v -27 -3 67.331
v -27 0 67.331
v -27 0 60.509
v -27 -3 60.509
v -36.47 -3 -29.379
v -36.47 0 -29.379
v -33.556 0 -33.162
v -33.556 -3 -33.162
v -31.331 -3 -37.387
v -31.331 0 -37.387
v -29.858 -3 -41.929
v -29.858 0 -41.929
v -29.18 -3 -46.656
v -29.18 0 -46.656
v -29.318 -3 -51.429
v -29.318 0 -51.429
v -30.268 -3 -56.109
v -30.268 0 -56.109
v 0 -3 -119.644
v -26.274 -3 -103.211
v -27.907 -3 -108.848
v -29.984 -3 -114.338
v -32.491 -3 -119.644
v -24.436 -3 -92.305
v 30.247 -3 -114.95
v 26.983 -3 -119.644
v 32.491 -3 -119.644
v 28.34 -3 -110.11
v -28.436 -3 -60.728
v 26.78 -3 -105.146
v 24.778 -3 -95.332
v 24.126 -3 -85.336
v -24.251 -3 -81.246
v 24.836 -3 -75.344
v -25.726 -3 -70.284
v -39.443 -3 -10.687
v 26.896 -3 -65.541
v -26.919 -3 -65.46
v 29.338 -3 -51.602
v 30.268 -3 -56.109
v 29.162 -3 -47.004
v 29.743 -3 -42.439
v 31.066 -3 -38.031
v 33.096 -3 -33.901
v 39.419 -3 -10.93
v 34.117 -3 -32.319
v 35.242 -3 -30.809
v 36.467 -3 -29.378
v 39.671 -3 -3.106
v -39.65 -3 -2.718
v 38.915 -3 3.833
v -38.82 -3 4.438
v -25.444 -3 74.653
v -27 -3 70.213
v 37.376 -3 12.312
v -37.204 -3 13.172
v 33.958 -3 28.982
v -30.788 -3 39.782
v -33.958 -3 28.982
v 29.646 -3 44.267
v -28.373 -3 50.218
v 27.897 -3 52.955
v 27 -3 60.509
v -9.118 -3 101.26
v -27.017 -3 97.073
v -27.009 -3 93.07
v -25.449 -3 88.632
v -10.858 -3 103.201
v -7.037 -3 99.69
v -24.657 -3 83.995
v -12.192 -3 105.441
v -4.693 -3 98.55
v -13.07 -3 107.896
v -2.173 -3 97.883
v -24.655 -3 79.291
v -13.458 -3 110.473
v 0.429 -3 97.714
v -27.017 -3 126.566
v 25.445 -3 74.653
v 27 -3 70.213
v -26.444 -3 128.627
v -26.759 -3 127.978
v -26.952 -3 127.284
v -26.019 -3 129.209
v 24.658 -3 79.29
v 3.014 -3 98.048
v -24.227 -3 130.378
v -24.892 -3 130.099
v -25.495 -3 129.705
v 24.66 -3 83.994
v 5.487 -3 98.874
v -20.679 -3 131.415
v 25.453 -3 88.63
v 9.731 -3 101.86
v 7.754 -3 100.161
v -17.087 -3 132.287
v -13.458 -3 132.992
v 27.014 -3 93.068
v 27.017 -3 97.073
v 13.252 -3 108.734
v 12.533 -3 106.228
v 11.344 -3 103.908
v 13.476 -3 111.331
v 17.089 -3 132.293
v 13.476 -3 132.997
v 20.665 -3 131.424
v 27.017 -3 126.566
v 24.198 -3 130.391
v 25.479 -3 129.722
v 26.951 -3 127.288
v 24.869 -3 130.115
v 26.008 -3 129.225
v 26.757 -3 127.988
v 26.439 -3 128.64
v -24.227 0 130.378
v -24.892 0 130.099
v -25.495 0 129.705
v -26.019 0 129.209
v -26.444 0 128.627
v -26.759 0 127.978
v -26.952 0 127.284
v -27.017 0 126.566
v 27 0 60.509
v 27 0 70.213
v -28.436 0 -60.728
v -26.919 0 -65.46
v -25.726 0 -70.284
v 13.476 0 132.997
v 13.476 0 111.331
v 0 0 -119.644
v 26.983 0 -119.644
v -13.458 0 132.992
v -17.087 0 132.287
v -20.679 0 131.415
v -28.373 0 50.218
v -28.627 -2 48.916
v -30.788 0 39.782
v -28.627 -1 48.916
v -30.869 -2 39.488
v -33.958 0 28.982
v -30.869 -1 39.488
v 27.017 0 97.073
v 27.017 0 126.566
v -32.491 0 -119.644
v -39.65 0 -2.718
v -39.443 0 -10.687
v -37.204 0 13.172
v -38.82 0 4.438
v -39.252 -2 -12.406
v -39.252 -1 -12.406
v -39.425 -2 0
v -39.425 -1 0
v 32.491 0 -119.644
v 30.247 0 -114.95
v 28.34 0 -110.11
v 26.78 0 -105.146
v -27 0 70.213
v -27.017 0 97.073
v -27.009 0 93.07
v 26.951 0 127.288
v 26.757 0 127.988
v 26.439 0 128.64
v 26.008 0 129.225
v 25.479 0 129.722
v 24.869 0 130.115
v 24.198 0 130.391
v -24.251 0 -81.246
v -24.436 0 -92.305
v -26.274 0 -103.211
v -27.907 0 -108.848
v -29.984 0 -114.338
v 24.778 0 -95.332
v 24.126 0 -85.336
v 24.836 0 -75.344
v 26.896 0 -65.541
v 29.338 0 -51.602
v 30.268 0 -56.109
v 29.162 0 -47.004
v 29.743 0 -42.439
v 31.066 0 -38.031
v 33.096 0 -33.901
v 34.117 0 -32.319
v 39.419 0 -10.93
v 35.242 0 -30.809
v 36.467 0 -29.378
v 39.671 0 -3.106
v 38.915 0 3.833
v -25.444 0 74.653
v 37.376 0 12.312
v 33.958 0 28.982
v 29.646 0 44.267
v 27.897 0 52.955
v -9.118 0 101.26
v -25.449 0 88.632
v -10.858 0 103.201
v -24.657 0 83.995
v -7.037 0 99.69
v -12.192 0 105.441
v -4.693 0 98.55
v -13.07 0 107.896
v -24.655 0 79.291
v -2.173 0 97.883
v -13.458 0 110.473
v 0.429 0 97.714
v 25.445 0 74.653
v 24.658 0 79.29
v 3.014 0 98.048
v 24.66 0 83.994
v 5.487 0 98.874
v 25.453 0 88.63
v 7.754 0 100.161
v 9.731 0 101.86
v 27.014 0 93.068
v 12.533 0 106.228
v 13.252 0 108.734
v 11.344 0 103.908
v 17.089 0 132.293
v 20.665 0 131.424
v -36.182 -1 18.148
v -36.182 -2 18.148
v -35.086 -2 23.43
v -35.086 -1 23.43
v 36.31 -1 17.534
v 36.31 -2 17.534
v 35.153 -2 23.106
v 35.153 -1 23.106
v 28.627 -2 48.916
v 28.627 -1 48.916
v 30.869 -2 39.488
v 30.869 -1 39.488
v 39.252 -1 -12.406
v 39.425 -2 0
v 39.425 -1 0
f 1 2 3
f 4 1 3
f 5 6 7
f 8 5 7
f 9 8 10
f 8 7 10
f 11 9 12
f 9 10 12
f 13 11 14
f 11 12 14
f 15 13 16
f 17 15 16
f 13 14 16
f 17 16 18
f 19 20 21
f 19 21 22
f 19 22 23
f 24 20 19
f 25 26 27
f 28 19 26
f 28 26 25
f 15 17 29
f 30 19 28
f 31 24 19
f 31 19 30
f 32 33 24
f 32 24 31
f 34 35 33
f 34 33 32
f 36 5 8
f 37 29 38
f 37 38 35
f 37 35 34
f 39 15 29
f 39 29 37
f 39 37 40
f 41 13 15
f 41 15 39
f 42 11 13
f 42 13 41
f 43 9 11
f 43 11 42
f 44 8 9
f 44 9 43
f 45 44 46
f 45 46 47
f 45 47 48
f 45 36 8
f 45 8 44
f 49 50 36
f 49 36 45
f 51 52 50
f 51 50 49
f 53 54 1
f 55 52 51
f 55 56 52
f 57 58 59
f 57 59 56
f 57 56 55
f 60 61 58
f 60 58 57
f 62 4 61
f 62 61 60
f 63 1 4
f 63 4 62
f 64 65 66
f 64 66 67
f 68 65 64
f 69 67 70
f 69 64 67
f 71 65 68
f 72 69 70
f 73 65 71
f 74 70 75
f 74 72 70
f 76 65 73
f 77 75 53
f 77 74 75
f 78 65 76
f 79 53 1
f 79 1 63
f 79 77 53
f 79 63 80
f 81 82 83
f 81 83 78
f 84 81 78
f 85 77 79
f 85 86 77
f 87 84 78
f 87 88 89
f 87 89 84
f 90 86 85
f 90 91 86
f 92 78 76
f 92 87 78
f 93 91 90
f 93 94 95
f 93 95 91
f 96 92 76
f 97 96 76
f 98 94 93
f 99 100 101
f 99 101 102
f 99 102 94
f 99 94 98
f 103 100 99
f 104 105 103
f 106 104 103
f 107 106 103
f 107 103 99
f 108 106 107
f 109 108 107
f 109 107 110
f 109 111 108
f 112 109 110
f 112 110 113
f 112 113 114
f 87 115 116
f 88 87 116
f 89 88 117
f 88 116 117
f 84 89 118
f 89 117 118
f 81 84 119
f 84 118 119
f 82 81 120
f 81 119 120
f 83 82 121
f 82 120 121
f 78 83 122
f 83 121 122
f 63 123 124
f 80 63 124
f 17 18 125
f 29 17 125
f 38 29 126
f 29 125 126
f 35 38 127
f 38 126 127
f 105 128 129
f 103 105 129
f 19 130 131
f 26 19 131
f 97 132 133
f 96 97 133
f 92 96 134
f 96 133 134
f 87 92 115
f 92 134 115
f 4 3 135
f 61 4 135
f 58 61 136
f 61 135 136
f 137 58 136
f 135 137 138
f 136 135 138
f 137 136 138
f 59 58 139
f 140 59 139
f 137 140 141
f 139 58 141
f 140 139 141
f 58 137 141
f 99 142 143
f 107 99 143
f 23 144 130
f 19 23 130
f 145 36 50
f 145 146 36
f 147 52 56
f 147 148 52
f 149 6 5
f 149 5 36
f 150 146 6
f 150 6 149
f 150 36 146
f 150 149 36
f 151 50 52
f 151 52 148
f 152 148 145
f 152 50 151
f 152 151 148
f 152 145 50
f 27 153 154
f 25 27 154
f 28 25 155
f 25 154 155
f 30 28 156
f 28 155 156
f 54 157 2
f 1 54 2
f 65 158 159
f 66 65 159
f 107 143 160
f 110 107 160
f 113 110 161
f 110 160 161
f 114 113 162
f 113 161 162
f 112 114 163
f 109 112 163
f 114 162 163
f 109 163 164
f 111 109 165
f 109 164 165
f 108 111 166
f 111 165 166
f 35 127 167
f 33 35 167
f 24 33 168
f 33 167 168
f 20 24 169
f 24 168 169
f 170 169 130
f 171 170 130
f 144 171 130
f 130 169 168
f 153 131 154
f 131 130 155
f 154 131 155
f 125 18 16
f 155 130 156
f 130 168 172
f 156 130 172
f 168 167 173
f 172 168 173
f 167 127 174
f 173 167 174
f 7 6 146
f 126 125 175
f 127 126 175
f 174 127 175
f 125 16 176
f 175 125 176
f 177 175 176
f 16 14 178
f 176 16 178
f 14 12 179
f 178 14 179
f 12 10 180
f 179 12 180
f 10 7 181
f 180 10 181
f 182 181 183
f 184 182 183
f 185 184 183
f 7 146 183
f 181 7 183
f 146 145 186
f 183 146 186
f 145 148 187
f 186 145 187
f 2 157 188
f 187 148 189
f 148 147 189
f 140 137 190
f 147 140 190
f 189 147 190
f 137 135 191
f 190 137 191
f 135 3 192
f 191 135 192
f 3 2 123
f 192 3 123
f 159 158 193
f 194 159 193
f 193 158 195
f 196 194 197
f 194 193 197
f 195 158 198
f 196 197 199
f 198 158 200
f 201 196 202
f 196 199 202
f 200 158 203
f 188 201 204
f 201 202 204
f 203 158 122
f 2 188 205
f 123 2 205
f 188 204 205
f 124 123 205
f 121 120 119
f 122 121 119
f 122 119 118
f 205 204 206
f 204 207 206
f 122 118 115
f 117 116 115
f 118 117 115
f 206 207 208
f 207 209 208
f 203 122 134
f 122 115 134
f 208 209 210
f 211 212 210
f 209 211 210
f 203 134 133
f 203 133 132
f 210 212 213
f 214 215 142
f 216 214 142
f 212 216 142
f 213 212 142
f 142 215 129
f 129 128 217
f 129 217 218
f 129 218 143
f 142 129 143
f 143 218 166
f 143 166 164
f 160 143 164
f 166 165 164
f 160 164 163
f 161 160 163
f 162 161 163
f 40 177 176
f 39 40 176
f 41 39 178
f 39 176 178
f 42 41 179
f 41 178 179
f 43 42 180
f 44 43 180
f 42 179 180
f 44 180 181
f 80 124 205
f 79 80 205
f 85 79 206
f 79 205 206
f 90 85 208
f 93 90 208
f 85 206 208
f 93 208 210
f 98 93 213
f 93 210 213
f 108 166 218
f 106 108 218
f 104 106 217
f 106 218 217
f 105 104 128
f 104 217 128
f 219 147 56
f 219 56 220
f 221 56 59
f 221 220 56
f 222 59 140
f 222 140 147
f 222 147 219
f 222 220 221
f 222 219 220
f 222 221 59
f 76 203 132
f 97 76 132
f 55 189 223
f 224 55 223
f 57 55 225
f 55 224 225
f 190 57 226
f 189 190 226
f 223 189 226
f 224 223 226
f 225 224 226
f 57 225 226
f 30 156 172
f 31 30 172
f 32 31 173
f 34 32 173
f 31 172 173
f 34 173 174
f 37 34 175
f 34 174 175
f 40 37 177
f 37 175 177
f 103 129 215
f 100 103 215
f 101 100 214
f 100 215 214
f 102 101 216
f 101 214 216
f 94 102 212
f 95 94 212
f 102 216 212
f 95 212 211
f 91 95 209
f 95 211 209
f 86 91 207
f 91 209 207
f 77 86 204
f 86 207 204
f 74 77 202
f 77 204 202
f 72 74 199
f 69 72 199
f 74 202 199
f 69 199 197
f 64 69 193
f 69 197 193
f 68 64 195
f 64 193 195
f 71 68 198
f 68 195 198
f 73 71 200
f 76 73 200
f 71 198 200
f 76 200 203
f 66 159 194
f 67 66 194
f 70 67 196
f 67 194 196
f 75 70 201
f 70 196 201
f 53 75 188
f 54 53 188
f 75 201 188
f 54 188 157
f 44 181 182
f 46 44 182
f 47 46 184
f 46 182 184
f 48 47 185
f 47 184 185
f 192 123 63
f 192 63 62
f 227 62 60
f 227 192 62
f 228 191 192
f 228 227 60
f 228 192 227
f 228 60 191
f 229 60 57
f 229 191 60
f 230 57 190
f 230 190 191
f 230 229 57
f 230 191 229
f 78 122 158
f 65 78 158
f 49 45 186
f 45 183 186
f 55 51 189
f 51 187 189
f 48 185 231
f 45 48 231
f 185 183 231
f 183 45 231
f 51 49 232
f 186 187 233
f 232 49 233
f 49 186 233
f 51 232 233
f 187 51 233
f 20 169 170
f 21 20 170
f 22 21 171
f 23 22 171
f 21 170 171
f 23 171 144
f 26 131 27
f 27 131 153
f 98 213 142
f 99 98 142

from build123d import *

# Parameters (mm, degrees)
F1_DEPTH = 3


with BuildPart() as f1:
    # F0 (on Front) → F1 (new body)
    with BuildSketch(Plane.XZ):
        with BuildLine():
            Line((-27.000000372, 67.3308055204), (-27.0000003572, 60.5094830675))
            add(Edge.make_bspline(
                [(-27.0000003783, 70.2132413448), (-27.000000372, 67.3308055204), (-26.8073760372, 64.0094927256), (-27.0000003572, 60.5094830675)],
                knots=[0, 0, 0, 0, 0.0797949898, 0.0797949898, 0.0797949898, 0.0797949898], degree=3))
            Line((-27.0000003783, 70.2132413448), (-27.000000372, 67.3308055204))
        make_face()
        with BuildLine():
            add(Edge.make_bspline(
                [(-27.0000003783, 70.2132413448), (-27.000000372, 67.3308055204), (-26.8073760372, 64.0094927256), (-27.0000003572, 60.5094830675)],
                knots=[0, 0, 0, 0, 0.0797949898, 0.0797949898, 0.0797949898, 0.0797949898], degree=3))
            add(Edge.make_bspline(
                [(-27.0000003572, 60.5094830675), (-27.2115741289, 56.665159338), (-28.5032848349, 48.9114242757), (-30.7959376047, 39.269131214), (-32.7990054786, 33.0934715655), (-33.9583066177, 28.9822912379)],
                knots=[0.0797949898, 0.0797949898, 0.0797949898, 0.0797949898, 0.1674398258, 0.2471817217, 0.3319487208, 0.3319487208, 0.3319487208, 0.3319487208], degree=3))
            add(Edge.make_bspline(
                [(-37.2038997366, 13.1717467116), (-36.2347795039, 17.9824819127), (-35.0866971891, 23.3074594843), (-33.9583066177, 28.9822912379)],
                knots=[0.7969356306, 0.7969356306, 0.7969356306, 0.7969356306, 1, 1, 1, 1], degree=3))
            add(Edge.make_bspline(
                [(-37.2038997366, 13.1717467116), (-37.3377860295, 11.7966552771), (-37.8318020205, 3.6131566189), (-34.8319401075, -9.4971781129), (-33.3481357614, -22.2384102756), (-27.0171200398, -42.5814503212), (-25.8644027957, -62.9931088525), (-25.7257572716, -70.2838279012)],
                knots=[0.4247645948, 0.4247645948, 0.4247645948, 0.4247645948, 0.4471809961, 0.5577287405, 0.6473745734, 0.7857235681, 0.8551599855, 0.8551599855, 0.8551599855, 0.8551599855], degree=3))
            ThreePointArc((-25.7257572716, -70.2838279012), (-24.1356221819, -86.7785971976), (-26.2738365605, -103.2113079605))
            add(Edge.make_bspline(
                [(-26.2738365605, -103.2113079605), (-26.4866600906, -108.6415730769), (-26.7346990947, -114.1409528022), (-26.9831408055, -119.6440920773)],
                knots=[0.952812329, 0.952812329, 0.952812329, 0.952812329, 0.9989562439, 0.9989562439, 0.9989562439, 0.9989562439], degree=3))
            Line((-26.9831408055, -119.6440920773), (0, -119.6440920773))
            Line((-6.3e-09, -119.6440920772), (26.9834561434, -119.6440920746))
            add(Edge.make_bspline(
                [(26.7797560592, -105.146393671), (26.7183865925, -110.0484100554), (26.7770637598, -114.8950679943), (26.9834561434, -119.6440920746)],
                knots=[0.9591803486, 0.9591803486, 0.9591803486, 0.9591803486, 0.9989568231, 0.9989568231, 0.9989568231, 0.9989568231], degree=3))
            ThreePointArc((26.7797560592, -105.146393671), (24.3110117736, -80.3279975292), (30.2677449554, -56.1088973147))
            ThreePointArc((30.2677449554, -56.1088973147), (29.3582502263, -44.7091117977), (33.0959109358, -33.901143306))
            add(Edge.make_bspline(
                [(37.3760657429, 12.312352727), (37.4207370145, 11.2848759506), (37.6386418394, 0.6550807977), (35.3777267818, -16.2805465578), (33.0959109358, -33.901143306)],
                knots=[0.5873705512, 0.5873705512, 0.5873705512, 0.5873705512, 0.6053891461, 0.7637611434, 0.7637611434, 0.7637611434, 0.7637611434], degree=3))
            add(Edge.make_bspline(
                [(37.3760657429, 12.312352727), (36.3723917785, 17.3454447873), (35.1543287191, 22.9673311954), (33.9583066177, 28.9822912379)],
                knots=[0.7847647083, 0.7847647083, 0.7847647083, 0.7847647083, 1, 1, 1, 1], degree=3))
            add(Edge.make_bspline(
                [(27.0000003572, 60.5094830675), (27.211196853, 56.9686043212), (28.5006041901, 48.7178368751), (30.8051136621, 39.5194264195), (32.7778690192, 32.6057451698), (33.9583066177, 28.9822912379)],
                knots=[0.1080256566, 0.1080256566, 0.1080256566, 0.1080256566, 0.2266783563, 0.3346321349, 0.449388848, 0.449388848, 0.449388848, 0.449388848], degree=3))
            add(Edge.make_bspline(
                [(27.0000003783, 70.2132413448), (27.0000003698, 66.3110286441), (26.8077195227, 63.7332255726), (27.0000003572, 60.5094830675)],
                knots=[0, 0, 0, 0, 0.1080256566, 0.1080256566, 0.1080256566, 0.1080256566], degree=3))
            ThreePointArc((27.0000003783, 70.2132413448), (24.5597225455, 81.642003215), (27.0140844765, 93.0677487616))
            Line((27.0140844765, 93.0677487616), (27.0165528594, 97.073236044))
            Line((27.0165528594, 97.073236044), (27.0165528594, 126.5655265976))
            ThreePointArc((27.0165528594, 126.5655265976), (26.2369988642, 128.9421564287), (24.1982364647, 130.3911290521))
            ThreePointArc((24.1982364647, 130.3911290521), (18.8821286754, 131.8789775648), (13.4760826795, 132.9967261563))
            Line((13.4760826795, 132.9967261563), (13.4760826795, 111.3308812648))
            ThreePointArc((13.4760826795, 111.3308812648), (0.4287985626, 97.7135570783), (-13.4581639711, 110.4734713575))
            ThreePointArc((-13.4581639711, 110.4734713575), (-13.4768872509, 111.1836209893), (-13.4581639711, 111.8937706212))
            Line((-13.4581639711, 111.8937706212), (-13.4581639711, 132.9915701483))
            ThreePointArc((-13.4581639711, 132.9915701483), (-18.8878136613, 131.8714457801), (-24.2268647008, 130.3780240861))
            ThreePointArc((-24.2268647008, 130.3780240861), (-26.2446496183, 128.9275955182), (-27.0165494938, 126.5655265976))
            Line((-27.0165494938, 126.5655265976), (-27.0165494938, 97.073236044))
            Line((-27.0165494938, 97.073236044), (-27.0094336483, 93.0702374443))
            ThreePointArc((-27.0094336483, 93.0702374443), (-24.5568387649, 81.642749654), (-27.0000003783, 70.2132413448))
        make_face()
        with BuildLine():
            add(Edge.make_bspline(
                [(-37.2038997366, 13.1717467116), (-37.3377860295, 11.7966552771), (-37.8318020205, 3.6131566189), (-34.8319401075, -9.4971781129), (-33.3481357614, -22.2384102756), (-27.0171200398, -42.5814503212), (-25.8644027957, -62.9931088525), (-25.7257572716, -70.2838279012)],
                knots=[0.4247645948, 0.4247645948, 0.4247645948, 0.4247645948, 0.4471809961, 0.5577287405, 0.6473745734, 0.7857235681, 0.8551599855, 0.8551599855, 0.8551599855, 0.8551599855], degree=3))
            add(Edge.make_bspline(
                [(-36.4695142582, -29.3788072578), (-37.5997978701, -23.1616359537), (-39.5544950983, -12.3662754957), (-40.0648496415, -1.9518214908), (-38.2132158377, 8.1614782915), (-37.2038997366, 13.1717467116)],
                knots=[0, 0, 0, 0, 0.3165678715, 0.5854488298, 0.7969356306, 0.7969356306, 0.7969356306, 0.7969356306], degree=3))
            ThreePointArc((-36.4695142582, -29.3788072578), (-29.8578197059, -41.9292933744), (-30.2677449554, -56.1088973147))
            ThreePointArc((-30.2677449554, -56.1088973147), (-27.6377010863, -63.081314369), (-25.7257572716, -70.2838279012))
        make_face()
        with BuildLine():
            add(Edge.make_bspline(
                [(-26.2738365605, -103.2113079605), (-26.4866600906, -108.6415730769), (-26.7346990947, -114.1409528022), (-26.9831408055, -119.6440920773)],
                knots=[0.952812329, 0.952812329, 0.952812329, 0.952812329, 0.9989562439, 0.9989562439, 0.9989562439, 0.9989562439], degree=3))
            ThreePointArc((-26.2738365605, -103.2113079605), (-28.8907910345, -111.6137859631), (-32.4913841825, -119.6440920773))
            Line((-32.4913841825, -119.6440920773), (-26.9831408055, -119.6440920773))
        make_face()
        with BuildLine():
            Line((-13.4581639711, 110.4734713575), (-13.4581639711, 111.8937706212))
            ThreePointArc((-13.4581639711, 111.8937706212), (-13.4768872509, 111.1836209893), (-13.4581639711, 110.4734713575))
        make_face()
        with BuildLine():
            add(Edge.make_bspline(
                [(26.7797560592, -105.146393671), (26.7183865925, -110.0484100554), (26.7770637598, -114.8950679943), (26.9834561434, -119.6440920746)],
                knots=[0.9591803486, 0.9591803486, 0.9591803486, 0.9591803486, 0.9989568231, 0.9989568231, 0.9989568231, 0.9989568231], degree=3))
            Line((26.9834561434, -119.6440920746), (32.4913842119, -119.644092074))
            ThreePointArc((32.4913841825, -119.6440920773), (29.2510439227, -112.5467338616), (26.7797560592, -105.146393671))
        make_face()
        with BuildLine():
            add(Edge.make_bspline(
                [(37.3760657429, 12.312352727), (37.4207370145, 11.2848759506), (37.6386418394, 0.6550807977), (35.3777267818, -16.2805465578), (33.0959109358, -33.901143306)],
                knots=[0.5873705512, 0.5873705512, 0.5873705512, 0.5873705512, 0.6053891461, 0.7637611434, 0.7637611434, 0.7637611434, 0.7637611434], degree=3))
            ThreePointArc((33.0959109358, -33.901143306), (34.6666972167, -31.5542800935), (36.4665470243, -29.37811899))
            add(Edge.make_bspline(
                [(36.4665470243, -29.37811899), (37.596826169, -23.1609722577), (39.5556506505, -12.3664838808), (40.0569196281, -2.1108359245), (38.3055086703, 7.651504698), (37.3760657429, 12.312352727)],
                knots=[0, 0, 0, 0, 0.3165666204, 0.5854480709, 0.7847647083, 0.7847647083, 0.7847647083, 0.7847647083], degree=3))
        make_face()
        with BuildLine():
            add(Edge.make_bspline(
                [(27.0000003783, 70.2132413448), (27.0000003698, 66.3110286441), (26.8077195227, 63.7332255726), (27.0000003572, 60.5094830675)],
                knots=[0, 0, 0, 0, 0.1080256566, 0.1080256566, 0.1080256566, 0.1080256566], degree=3))
            Line((27.0000003572, 60.5094830675), (27.0000003783, 70.2132413448))
        make_face()
    extrude(amount=F1_DEPTH)


solid = f1.part
